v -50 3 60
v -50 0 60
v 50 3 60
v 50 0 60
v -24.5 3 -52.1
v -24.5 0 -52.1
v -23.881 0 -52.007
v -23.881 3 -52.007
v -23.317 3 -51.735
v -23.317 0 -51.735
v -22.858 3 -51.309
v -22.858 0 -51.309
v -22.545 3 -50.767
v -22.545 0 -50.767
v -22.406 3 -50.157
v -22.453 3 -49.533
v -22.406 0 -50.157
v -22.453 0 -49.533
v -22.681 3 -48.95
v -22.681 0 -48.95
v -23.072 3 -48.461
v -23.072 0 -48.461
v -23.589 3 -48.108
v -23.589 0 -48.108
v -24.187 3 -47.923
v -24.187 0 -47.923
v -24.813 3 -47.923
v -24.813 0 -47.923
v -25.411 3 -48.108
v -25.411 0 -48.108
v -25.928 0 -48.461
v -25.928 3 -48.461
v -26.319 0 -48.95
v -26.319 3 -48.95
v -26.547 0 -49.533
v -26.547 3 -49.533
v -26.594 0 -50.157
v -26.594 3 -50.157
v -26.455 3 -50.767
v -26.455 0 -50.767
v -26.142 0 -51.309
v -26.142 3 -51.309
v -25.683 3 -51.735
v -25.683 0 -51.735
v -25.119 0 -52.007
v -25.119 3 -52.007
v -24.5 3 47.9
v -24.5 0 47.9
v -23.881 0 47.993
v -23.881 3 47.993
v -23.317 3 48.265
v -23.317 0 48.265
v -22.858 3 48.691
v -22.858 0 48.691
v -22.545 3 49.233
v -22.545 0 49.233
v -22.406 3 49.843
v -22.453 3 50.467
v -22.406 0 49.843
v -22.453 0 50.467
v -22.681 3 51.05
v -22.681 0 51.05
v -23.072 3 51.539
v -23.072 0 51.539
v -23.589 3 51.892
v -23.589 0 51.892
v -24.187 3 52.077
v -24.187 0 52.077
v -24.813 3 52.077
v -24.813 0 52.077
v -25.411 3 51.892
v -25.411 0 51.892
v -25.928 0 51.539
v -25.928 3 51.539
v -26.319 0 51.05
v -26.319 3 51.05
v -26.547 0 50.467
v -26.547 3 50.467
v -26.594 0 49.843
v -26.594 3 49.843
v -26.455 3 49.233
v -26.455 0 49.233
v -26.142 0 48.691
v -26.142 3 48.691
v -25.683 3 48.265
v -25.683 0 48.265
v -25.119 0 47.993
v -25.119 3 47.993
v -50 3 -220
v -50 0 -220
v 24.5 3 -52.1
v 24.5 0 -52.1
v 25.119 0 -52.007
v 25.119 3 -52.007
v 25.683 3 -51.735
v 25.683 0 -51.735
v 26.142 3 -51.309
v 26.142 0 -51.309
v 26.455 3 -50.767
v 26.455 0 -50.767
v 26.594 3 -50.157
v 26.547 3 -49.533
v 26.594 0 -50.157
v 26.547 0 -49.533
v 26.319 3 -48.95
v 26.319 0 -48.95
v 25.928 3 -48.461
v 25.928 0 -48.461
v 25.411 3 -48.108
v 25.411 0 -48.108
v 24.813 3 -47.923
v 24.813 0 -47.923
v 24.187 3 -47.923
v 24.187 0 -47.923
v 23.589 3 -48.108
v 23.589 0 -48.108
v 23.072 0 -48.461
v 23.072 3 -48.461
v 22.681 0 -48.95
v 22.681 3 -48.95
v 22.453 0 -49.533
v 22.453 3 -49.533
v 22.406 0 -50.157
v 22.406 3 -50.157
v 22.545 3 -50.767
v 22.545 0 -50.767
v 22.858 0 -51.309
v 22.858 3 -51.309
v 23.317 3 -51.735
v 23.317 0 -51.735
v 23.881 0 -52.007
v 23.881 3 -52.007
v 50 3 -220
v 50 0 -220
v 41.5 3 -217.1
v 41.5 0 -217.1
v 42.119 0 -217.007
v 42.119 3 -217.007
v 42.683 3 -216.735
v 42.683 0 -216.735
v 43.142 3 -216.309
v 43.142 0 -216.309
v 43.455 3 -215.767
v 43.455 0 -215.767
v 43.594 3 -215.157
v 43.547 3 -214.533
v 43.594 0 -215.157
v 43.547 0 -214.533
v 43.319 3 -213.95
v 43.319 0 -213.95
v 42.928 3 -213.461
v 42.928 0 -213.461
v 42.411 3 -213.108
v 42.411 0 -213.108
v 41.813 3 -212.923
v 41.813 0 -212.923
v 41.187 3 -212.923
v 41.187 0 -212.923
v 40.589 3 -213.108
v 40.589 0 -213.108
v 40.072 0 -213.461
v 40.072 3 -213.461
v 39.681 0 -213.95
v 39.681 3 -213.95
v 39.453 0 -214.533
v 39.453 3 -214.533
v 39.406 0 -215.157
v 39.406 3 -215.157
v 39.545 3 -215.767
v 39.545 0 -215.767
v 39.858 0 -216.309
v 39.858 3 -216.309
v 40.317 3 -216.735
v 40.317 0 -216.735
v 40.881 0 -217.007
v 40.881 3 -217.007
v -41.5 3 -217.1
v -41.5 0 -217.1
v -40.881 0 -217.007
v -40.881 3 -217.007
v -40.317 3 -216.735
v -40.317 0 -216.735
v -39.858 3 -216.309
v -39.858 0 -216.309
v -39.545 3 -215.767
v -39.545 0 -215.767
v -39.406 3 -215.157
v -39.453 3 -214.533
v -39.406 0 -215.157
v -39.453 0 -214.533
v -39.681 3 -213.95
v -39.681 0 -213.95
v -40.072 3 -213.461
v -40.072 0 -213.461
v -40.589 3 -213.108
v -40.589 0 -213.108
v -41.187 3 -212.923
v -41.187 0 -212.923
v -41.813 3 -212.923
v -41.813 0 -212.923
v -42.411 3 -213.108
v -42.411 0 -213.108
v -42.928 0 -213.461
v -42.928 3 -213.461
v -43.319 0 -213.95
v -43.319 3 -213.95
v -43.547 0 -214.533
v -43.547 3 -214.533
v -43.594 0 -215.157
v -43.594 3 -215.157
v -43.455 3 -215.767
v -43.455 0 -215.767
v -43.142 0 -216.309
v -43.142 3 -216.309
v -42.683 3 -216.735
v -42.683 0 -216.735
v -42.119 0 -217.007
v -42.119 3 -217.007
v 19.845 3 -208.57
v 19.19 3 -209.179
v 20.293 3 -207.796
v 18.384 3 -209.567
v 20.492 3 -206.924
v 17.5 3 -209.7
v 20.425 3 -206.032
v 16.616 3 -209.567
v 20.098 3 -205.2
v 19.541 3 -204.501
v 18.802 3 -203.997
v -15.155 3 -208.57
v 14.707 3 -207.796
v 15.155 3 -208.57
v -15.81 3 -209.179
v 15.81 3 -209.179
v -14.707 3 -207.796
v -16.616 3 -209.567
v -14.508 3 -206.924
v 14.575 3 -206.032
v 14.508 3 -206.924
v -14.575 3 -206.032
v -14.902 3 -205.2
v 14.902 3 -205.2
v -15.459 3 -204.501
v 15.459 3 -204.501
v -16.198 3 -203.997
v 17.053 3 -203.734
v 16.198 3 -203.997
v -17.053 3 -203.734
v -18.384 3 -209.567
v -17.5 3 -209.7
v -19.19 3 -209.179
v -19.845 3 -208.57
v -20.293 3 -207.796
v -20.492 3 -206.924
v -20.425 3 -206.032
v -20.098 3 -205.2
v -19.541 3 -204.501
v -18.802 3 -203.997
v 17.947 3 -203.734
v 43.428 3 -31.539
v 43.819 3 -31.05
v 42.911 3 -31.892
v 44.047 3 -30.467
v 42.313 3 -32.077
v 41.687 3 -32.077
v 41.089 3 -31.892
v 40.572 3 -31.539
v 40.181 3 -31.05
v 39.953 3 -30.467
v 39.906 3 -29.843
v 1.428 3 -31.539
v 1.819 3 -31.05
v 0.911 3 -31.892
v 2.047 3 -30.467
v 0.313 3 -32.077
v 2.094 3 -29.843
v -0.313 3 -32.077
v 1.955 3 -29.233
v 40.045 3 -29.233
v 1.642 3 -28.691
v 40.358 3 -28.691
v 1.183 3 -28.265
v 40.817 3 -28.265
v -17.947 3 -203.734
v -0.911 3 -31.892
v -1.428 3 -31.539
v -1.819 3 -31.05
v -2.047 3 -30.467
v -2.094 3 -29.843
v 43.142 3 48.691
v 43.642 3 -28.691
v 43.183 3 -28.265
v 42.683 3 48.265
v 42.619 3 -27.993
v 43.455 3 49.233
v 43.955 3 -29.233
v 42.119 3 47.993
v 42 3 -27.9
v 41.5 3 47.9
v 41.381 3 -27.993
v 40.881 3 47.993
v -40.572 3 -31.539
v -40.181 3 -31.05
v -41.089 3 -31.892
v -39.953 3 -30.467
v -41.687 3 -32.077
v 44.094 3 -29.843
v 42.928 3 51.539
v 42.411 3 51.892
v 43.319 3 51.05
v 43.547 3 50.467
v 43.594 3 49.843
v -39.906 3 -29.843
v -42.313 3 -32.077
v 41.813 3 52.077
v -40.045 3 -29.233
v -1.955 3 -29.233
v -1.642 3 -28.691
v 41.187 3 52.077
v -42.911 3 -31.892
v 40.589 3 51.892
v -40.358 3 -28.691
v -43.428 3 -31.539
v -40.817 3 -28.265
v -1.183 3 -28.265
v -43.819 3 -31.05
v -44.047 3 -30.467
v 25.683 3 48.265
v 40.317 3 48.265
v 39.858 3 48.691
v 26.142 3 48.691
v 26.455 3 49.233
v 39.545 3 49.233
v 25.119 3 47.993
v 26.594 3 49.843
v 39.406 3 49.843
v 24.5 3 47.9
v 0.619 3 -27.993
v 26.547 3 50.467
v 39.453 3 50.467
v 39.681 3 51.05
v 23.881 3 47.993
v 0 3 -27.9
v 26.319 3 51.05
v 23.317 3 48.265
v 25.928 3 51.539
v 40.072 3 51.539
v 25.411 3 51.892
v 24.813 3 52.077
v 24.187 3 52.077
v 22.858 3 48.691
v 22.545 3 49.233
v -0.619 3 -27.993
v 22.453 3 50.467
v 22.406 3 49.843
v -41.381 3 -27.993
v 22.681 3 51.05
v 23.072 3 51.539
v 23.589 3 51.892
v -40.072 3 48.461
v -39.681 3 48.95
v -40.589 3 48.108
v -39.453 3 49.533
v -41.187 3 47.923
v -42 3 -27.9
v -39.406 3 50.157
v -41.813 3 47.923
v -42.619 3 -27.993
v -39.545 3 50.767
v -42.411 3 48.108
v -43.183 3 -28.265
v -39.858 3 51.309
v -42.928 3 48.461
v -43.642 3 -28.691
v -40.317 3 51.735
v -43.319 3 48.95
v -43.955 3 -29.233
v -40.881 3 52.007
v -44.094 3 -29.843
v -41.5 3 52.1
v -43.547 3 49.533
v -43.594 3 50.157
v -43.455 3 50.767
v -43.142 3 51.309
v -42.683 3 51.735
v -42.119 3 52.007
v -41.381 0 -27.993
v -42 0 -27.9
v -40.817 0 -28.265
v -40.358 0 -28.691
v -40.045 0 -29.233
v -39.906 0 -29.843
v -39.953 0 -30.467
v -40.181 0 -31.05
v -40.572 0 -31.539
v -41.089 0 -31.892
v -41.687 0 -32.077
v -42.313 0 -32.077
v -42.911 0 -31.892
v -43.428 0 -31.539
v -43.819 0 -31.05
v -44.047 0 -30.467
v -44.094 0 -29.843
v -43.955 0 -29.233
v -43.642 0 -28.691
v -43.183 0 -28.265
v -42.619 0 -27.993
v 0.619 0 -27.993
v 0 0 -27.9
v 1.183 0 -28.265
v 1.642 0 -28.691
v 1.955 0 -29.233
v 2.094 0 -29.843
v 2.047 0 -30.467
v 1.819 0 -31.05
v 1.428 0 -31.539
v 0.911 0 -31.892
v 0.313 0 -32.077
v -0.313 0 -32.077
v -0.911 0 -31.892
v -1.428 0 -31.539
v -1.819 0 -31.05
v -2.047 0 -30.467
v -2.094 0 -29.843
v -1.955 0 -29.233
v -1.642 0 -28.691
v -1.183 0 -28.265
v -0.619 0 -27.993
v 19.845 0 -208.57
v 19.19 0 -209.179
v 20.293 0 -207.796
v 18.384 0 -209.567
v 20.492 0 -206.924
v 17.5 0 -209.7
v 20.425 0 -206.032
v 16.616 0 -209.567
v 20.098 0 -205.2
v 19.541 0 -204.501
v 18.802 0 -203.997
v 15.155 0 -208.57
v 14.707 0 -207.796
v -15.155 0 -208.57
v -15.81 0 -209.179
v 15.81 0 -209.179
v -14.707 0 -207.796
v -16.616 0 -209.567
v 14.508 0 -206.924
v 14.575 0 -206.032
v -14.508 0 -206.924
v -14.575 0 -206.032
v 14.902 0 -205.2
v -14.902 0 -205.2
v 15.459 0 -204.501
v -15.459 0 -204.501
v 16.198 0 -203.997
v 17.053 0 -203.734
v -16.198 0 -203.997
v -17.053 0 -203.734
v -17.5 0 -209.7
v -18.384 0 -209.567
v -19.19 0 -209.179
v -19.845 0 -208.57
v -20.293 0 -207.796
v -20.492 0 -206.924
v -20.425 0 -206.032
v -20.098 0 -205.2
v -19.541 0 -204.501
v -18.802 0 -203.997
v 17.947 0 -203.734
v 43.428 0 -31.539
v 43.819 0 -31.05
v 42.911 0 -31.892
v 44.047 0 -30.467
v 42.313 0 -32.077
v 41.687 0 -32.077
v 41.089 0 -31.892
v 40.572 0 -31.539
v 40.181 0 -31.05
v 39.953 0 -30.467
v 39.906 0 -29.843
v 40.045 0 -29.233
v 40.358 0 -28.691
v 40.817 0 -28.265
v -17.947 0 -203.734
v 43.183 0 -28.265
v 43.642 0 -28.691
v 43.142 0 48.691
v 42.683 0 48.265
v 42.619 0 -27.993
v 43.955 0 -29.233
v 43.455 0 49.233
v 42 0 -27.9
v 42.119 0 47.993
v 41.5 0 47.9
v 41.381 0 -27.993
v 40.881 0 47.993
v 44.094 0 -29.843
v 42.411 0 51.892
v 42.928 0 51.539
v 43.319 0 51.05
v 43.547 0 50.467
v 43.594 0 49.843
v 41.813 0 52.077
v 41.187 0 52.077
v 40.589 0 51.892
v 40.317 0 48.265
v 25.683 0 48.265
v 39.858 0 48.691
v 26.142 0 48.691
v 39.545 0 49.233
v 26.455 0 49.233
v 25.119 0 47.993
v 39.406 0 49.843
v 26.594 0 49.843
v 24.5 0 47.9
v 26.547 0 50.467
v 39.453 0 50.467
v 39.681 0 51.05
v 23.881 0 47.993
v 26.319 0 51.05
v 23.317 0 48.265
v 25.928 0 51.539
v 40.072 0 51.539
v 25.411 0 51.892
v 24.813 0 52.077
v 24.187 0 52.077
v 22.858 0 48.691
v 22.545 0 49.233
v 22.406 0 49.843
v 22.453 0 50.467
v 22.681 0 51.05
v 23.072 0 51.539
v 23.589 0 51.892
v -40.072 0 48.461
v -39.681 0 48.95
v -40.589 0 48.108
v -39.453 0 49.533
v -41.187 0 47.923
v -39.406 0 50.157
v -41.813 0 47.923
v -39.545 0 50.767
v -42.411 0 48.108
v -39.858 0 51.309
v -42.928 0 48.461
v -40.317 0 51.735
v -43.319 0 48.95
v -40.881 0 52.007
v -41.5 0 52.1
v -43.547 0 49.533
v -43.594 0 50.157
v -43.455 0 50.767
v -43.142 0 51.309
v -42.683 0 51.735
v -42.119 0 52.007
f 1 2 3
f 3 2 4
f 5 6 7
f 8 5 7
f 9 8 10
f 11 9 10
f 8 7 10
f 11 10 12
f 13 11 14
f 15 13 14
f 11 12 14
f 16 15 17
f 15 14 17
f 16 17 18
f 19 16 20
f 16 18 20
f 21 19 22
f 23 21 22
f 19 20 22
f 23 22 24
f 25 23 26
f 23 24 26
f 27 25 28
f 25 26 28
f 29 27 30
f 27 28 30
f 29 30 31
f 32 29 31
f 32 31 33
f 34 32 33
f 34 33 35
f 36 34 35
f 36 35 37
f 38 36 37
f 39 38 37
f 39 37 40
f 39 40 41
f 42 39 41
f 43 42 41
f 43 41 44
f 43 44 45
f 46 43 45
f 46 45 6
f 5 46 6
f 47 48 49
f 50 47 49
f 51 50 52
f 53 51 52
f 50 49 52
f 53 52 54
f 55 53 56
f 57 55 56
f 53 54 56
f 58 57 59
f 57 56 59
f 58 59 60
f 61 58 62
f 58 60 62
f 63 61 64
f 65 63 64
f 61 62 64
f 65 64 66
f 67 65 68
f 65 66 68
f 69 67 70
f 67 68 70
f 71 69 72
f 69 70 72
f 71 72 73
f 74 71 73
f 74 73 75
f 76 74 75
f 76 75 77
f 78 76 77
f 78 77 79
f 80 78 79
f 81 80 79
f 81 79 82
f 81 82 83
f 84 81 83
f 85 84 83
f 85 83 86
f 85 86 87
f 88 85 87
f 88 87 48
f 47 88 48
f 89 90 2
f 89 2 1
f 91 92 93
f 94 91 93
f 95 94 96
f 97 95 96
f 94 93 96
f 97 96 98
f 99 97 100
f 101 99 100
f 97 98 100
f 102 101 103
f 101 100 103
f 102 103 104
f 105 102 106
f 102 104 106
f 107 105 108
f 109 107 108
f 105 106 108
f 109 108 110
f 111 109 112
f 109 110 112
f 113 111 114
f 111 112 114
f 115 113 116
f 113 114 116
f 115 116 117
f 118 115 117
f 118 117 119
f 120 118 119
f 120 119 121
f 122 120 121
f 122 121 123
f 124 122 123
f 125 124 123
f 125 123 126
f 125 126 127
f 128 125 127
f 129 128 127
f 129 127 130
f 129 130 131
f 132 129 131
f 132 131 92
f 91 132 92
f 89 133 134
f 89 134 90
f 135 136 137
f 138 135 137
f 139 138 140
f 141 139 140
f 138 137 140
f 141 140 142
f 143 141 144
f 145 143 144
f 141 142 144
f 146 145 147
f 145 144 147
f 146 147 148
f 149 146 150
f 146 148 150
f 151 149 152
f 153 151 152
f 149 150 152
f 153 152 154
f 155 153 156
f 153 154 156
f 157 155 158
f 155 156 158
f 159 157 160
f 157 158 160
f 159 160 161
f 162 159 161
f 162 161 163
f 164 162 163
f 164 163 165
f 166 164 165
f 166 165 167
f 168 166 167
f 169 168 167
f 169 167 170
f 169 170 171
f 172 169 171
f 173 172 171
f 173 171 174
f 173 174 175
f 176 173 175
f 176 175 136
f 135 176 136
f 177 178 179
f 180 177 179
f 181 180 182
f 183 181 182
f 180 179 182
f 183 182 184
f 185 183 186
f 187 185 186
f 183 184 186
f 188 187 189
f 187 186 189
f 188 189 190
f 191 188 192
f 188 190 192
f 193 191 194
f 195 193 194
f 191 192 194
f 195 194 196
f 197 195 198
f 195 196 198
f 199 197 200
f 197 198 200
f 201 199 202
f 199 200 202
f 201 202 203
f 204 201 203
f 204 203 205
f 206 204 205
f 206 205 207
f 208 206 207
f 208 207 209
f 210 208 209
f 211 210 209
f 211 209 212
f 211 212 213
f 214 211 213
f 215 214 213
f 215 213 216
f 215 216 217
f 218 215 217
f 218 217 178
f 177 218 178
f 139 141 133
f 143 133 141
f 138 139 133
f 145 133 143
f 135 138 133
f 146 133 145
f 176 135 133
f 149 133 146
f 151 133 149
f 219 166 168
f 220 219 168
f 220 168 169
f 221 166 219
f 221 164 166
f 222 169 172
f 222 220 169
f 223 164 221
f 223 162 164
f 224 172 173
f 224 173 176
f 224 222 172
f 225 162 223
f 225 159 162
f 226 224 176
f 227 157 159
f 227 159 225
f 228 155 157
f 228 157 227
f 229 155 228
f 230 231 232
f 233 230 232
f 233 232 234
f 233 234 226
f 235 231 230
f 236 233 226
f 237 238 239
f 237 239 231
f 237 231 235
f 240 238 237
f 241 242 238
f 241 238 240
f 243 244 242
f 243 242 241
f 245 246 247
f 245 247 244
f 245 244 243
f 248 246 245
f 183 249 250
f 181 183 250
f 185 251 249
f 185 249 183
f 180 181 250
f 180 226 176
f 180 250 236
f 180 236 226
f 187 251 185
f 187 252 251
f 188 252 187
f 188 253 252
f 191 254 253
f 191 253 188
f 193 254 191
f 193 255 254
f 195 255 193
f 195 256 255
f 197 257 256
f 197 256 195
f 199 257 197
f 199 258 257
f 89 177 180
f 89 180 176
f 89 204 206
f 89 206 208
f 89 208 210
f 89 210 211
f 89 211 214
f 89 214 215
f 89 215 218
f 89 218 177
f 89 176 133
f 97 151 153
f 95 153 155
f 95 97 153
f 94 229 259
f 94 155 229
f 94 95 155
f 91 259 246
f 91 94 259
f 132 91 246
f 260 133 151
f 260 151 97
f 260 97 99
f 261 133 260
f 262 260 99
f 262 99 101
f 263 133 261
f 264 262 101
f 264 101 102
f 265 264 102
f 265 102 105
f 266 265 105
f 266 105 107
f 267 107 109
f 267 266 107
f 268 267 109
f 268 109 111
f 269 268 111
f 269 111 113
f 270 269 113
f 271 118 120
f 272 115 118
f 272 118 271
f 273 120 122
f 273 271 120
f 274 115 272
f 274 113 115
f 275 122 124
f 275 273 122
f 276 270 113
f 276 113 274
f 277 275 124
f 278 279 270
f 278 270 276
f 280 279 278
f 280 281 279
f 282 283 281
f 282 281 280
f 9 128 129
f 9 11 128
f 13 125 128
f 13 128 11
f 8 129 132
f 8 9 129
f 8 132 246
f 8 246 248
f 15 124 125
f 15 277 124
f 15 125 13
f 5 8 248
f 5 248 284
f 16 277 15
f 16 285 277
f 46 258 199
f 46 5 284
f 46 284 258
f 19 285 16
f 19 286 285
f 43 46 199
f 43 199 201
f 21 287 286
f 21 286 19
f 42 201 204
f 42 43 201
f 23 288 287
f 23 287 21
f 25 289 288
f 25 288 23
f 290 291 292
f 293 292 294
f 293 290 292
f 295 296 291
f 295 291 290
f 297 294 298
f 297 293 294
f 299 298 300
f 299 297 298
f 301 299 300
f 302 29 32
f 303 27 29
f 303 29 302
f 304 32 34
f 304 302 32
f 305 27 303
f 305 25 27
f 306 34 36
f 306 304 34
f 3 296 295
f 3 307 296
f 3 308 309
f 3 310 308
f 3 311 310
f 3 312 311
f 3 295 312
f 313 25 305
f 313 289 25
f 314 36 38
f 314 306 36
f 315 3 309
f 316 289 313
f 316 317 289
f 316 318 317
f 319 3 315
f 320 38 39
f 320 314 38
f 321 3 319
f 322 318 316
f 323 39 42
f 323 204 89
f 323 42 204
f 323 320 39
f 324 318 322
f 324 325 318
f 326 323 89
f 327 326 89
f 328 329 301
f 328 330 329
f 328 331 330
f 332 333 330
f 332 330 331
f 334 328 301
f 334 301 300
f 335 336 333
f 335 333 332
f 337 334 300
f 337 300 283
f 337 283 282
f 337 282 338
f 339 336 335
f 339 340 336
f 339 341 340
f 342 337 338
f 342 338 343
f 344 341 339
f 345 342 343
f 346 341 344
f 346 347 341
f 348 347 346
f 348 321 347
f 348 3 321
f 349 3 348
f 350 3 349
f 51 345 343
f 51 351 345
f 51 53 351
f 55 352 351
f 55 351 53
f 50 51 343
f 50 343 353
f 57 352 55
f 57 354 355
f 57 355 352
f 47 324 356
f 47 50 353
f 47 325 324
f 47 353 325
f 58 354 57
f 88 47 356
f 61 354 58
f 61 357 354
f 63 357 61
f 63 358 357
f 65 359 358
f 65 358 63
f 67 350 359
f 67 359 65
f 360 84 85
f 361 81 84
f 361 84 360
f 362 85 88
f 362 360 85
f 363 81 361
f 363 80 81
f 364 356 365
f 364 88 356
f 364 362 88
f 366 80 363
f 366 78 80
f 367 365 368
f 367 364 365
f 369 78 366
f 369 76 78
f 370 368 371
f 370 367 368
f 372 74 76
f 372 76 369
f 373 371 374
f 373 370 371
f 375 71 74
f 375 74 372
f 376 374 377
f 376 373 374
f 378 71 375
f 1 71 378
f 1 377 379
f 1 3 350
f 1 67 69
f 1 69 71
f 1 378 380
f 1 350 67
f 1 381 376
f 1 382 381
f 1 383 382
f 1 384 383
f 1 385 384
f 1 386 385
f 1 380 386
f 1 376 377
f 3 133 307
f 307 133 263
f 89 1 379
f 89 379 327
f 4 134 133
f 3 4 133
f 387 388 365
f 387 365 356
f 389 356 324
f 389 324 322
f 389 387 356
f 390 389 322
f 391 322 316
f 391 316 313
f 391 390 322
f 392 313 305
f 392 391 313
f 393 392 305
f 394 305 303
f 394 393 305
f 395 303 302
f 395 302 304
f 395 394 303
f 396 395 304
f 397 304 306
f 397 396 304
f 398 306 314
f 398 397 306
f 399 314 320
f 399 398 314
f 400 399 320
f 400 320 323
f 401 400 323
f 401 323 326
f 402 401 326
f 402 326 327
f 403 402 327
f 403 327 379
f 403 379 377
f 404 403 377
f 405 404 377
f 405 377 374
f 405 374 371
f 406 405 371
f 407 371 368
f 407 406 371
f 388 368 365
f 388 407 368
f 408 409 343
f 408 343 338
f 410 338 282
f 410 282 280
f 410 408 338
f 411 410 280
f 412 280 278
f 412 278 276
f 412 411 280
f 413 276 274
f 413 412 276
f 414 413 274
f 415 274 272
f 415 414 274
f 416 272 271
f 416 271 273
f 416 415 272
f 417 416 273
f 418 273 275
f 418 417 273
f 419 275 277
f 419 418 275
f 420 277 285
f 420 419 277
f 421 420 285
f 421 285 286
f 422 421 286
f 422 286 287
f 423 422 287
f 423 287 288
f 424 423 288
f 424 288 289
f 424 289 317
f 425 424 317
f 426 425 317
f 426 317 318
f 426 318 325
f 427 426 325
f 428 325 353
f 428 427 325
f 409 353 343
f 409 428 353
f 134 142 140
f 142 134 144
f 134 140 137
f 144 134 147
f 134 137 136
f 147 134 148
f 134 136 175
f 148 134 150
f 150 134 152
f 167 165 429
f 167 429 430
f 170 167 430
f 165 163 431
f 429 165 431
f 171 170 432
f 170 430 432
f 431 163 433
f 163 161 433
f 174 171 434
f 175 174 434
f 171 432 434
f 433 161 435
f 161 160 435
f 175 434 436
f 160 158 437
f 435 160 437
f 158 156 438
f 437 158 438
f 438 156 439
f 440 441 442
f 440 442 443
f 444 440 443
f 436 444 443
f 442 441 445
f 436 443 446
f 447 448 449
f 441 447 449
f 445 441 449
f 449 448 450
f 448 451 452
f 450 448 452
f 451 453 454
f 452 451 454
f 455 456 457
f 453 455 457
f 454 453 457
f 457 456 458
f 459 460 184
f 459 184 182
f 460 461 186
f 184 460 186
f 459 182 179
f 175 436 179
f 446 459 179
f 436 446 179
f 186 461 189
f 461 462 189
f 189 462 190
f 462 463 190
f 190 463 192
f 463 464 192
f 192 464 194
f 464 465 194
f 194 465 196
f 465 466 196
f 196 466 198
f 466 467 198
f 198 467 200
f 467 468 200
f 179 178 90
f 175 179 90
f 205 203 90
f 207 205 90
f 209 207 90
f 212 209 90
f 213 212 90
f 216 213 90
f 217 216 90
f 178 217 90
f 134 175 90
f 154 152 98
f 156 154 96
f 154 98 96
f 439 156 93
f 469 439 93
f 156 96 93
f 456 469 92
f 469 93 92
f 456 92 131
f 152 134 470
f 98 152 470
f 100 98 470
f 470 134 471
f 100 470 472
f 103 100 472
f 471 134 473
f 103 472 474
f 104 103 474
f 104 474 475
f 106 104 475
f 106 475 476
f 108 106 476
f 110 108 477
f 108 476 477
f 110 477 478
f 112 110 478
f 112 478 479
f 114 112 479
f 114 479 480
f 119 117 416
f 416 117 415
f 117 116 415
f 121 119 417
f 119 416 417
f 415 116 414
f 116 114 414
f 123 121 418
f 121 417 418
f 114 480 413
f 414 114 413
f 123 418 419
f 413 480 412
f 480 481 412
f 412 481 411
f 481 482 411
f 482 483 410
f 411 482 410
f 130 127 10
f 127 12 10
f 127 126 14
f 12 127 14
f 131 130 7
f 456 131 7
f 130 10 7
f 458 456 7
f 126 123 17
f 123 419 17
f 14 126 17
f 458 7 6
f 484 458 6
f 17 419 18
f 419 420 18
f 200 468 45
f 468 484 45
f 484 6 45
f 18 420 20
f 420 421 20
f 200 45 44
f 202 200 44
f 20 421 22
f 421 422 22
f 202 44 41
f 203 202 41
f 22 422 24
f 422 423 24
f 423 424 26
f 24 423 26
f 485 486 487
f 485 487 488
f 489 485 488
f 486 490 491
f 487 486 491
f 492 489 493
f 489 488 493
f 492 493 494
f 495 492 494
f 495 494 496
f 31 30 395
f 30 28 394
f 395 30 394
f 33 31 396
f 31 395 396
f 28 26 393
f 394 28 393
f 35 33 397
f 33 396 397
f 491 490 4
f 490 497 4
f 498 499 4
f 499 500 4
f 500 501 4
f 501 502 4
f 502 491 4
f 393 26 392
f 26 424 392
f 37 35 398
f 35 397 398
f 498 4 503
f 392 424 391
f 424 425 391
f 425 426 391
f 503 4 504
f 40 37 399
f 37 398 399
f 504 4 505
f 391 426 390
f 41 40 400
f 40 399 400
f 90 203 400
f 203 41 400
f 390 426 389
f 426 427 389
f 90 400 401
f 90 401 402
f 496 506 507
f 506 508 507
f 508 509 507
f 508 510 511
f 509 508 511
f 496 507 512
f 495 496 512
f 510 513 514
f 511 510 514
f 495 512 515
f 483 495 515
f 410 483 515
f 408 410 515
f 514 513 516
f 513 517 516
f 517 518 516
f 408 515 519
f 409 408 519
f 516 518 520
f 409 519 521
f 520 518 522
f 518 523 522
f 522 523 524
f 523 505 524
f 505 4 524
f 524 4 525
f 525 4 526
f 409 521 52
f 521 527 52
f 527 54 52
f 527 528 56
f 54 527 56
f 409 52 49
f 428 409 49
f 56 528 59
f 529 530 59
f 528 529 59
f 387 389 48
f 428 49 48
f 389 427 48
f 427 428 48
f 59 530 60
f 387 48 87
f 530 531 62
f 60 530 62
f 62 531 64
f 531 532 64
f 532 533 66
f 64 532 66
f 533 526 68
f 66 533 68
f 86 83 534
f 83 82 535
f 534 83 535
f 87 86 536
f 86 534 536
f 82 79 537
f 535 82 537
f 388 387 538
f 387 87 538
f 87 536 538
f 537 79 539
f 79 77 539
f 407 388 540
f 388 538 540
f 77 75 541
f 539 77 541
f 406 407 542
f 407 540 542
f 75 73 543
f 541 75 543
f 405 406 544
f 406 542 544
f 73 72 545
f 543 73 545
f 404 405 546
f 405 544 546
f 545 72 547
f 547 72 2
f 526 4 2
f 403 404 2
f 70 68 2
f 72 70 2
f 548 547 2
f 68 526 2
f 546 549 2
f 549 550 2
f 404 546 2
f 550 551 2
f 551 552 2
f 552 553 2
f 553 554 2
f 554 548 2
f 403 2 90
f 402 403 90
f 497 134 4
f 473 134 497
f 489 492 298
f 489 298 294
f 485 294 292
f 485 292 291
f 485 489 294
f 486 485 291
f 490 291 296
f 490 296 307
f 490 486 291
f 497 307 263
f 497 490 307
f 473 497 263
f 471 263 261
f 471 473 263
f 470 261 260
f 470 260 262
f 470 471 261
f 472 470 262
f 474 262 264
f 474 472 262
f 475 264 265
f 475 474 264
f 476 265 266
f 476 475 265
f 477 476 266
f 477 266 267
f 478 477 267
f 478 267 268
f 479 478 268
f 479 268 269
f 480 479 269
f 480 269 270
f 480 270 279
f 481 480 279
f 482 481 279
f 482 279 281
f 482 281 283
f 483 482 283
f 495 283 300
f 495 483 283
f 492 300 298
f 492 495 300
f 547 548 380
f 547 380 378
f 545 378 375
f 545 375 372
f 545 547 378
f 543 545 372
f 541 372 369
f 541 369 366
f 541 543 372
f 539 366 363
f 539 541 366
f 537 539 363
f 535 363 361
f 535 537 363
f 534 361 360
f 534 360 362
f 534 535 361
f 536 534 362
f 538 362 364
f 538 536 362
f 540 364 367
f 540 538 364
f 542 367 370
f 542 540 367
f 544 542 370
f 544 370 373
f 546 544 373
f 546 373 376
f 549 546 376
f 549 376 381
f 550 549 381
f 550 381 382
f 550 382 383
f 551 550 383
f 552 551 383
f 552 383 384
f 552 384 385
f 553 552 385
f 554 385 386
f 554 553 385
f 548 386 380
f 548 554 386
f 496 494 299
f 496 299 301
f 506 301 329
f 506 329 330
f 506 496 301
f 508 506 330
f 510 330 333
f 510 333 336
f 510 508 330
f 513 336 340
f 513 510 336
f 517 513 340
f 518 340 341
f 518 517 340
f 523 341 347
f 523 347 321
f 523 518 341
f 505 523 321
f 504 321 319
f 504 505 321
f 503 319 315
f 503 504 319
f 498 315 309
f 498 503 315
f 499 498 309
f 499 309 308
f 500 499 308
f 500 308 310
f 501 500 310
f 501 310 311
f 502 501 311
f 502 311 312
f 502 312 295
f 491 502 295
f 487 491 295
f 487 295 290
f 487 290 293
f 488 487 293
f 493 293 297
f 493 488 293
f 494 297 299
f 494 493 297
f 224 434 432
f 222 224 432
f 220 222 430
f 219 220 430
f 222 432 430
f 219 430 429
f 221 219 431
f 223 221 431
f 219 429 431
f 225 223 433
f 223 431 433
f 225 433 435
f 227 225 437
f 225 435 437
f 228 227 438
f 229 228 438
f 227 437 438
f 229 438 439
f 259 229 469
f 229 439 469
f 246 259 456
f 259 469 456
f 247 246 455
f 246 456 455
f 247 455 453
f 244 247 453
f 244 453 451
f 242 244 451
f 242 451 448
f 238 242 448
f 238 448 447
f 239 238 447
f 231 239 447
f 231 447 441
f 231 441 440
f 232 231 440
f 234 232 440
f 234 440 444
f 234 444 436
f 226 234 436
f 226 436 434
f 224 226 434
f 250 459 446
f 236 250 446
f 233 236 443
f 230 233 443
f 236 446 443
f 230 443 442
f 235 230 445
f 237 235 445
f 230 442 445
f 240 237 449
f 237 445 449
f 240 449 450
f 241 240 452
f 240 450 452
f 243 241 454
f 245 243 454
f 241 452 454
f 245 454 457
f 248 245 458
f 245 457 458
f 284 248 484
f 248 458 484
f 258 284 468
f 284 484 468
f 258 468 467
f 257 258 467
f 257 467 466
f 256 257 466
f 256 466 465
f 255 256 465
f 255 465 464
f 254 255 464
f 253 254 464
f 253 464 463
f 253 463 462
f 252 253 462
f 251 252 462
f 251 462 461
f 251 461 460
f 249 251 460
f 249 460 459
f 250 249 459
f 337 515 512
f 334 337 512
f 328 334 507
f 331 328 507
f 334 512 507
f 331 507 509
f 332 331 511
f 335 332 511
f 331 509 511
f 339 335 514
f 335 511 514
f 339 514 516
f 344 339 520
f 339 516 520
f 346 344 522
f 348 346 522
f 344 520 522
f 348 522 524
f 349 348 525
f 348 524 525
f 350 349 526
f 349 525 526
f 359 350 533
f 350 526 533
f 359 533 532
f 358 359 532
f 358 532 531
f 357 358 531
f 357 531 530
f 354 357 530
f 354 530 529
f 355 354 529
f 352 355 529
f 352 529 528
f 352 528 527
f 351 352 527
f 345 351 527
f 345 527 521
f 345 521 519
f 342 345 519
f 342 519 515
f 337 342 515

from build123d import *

# Parameters (mm, degrees)
SKETCH1_W           = 100
SKETCH1_H           = 120
SKETCH1_R           = 2.1
BOSS_EXTRUDE1_DEPTH = 3
SKETCH2_R           = 2.1
CUT_EXTRUDE1_DEPTH  = 10
SKETCH3_W           = 100
SKETCH3_H           = 3
BOSS_EXTRUDE2_DEPTH = 160
SKETCH4_R           = 3
SKETCH4_R_2         = 2.1
CUT_EXTRUDE2_DEPTH  = 160


with BuildPart() as part:
    # Sketch1 → Boss-Extrude1 (new body)
    with BuildSketch(Plane(origin=(0, 0, 0), x_dir=(1, 0, 0), z_dir=(0, 1, 0))):
        Rectangle(SKETCH1_W, SKETCH1_H)
        with Locations(Location((41.5, -50, 0), (0, 0, 90))):
            Circle(SKETCH1_R, mode=Mode.SUBTRACT)
        with Locations(Location((-41.5, -50, 0), (0, 0, 270))):
            Circle(SKETCH1_R, mode=Mode.SUBTRACT)
        with Locations(Location((-42, 30, 0), (0, 0, 270))):
            Circle(SKETCH1_R, mode=Mode.SUBTRACT)
        with Locations(Location((0, 30, 0), (0, 0, 270))):
            Circle(SKETCH1_R, mode=Mode.SUBTRACT)
        with Locations(Location((42, 30, 0), (0, 0, 270))):
            Circle(SKETCH1_R, mode=Mode.SUBTRACT)
    extrude(amount=BOSS_EXTRUDE1_DEPTH)

    # Sketch2 → Cut-Extrude1 (cut)
    with BuildSketch(Plane.XZ):
        with Locations(Location((-24.5, -50, 0), (0, 0, 270))):
            Circle(SKETCH2_R)
        with Locations(Location((24.5, -50, 0), (0, 0, 270))):
            Circle(SKETCH2_R)
        with Locations(Location((24.5, 50, 0), (0, 0, 270))):
            Circle(SKETCH2_R)
        with Locations(Location((-24.5, 50, 0), (0, 0, 270))):
            Circle(SKETCH2_R)
    extrude(amount=-CUT_EXTRUDE1_DEPTH, mode=Mode.SUBTRACT)

    # Sketch3 → Boss-Extrude2 (add)
    with BuildSketch(Plane(origin=(0, 0, -60), x_dir=(-1, 0, 0), z_dir=(0, 0, -1))):
        with Locations((0, 1.5)):
            Rectangle(SKETCH3_W, SKETCH3_H)
    extrude(amount=BOSS_EXTRUDE2_DEPTH)

    # Sketch4 → Cut-Extrude2 (cut)
    with BuildSketch(Plane.XZ):
        with Locations(Location((17.5, -206.7, 0), (0, 0, 270))):
            Circle(SKETCH4_R)
        with Locations(Location((-17.5, -206.7, 0), (0, 0, 270))):
            Circle(SKETCH4_R)
        with Locations(Location((-41.5, -215, 0), (0, 0, 270))):
            Circle(SKETCH4_R_2)
        with Locations(Location((41.5, -215, 0), (0, 0, 270))):
            Circle(SKETCH4_R_2)
    extrude(amount=-CUT_EXTRUDE2_DEPTH, mode=Mode.SUBTRACT)


solid = part.part
